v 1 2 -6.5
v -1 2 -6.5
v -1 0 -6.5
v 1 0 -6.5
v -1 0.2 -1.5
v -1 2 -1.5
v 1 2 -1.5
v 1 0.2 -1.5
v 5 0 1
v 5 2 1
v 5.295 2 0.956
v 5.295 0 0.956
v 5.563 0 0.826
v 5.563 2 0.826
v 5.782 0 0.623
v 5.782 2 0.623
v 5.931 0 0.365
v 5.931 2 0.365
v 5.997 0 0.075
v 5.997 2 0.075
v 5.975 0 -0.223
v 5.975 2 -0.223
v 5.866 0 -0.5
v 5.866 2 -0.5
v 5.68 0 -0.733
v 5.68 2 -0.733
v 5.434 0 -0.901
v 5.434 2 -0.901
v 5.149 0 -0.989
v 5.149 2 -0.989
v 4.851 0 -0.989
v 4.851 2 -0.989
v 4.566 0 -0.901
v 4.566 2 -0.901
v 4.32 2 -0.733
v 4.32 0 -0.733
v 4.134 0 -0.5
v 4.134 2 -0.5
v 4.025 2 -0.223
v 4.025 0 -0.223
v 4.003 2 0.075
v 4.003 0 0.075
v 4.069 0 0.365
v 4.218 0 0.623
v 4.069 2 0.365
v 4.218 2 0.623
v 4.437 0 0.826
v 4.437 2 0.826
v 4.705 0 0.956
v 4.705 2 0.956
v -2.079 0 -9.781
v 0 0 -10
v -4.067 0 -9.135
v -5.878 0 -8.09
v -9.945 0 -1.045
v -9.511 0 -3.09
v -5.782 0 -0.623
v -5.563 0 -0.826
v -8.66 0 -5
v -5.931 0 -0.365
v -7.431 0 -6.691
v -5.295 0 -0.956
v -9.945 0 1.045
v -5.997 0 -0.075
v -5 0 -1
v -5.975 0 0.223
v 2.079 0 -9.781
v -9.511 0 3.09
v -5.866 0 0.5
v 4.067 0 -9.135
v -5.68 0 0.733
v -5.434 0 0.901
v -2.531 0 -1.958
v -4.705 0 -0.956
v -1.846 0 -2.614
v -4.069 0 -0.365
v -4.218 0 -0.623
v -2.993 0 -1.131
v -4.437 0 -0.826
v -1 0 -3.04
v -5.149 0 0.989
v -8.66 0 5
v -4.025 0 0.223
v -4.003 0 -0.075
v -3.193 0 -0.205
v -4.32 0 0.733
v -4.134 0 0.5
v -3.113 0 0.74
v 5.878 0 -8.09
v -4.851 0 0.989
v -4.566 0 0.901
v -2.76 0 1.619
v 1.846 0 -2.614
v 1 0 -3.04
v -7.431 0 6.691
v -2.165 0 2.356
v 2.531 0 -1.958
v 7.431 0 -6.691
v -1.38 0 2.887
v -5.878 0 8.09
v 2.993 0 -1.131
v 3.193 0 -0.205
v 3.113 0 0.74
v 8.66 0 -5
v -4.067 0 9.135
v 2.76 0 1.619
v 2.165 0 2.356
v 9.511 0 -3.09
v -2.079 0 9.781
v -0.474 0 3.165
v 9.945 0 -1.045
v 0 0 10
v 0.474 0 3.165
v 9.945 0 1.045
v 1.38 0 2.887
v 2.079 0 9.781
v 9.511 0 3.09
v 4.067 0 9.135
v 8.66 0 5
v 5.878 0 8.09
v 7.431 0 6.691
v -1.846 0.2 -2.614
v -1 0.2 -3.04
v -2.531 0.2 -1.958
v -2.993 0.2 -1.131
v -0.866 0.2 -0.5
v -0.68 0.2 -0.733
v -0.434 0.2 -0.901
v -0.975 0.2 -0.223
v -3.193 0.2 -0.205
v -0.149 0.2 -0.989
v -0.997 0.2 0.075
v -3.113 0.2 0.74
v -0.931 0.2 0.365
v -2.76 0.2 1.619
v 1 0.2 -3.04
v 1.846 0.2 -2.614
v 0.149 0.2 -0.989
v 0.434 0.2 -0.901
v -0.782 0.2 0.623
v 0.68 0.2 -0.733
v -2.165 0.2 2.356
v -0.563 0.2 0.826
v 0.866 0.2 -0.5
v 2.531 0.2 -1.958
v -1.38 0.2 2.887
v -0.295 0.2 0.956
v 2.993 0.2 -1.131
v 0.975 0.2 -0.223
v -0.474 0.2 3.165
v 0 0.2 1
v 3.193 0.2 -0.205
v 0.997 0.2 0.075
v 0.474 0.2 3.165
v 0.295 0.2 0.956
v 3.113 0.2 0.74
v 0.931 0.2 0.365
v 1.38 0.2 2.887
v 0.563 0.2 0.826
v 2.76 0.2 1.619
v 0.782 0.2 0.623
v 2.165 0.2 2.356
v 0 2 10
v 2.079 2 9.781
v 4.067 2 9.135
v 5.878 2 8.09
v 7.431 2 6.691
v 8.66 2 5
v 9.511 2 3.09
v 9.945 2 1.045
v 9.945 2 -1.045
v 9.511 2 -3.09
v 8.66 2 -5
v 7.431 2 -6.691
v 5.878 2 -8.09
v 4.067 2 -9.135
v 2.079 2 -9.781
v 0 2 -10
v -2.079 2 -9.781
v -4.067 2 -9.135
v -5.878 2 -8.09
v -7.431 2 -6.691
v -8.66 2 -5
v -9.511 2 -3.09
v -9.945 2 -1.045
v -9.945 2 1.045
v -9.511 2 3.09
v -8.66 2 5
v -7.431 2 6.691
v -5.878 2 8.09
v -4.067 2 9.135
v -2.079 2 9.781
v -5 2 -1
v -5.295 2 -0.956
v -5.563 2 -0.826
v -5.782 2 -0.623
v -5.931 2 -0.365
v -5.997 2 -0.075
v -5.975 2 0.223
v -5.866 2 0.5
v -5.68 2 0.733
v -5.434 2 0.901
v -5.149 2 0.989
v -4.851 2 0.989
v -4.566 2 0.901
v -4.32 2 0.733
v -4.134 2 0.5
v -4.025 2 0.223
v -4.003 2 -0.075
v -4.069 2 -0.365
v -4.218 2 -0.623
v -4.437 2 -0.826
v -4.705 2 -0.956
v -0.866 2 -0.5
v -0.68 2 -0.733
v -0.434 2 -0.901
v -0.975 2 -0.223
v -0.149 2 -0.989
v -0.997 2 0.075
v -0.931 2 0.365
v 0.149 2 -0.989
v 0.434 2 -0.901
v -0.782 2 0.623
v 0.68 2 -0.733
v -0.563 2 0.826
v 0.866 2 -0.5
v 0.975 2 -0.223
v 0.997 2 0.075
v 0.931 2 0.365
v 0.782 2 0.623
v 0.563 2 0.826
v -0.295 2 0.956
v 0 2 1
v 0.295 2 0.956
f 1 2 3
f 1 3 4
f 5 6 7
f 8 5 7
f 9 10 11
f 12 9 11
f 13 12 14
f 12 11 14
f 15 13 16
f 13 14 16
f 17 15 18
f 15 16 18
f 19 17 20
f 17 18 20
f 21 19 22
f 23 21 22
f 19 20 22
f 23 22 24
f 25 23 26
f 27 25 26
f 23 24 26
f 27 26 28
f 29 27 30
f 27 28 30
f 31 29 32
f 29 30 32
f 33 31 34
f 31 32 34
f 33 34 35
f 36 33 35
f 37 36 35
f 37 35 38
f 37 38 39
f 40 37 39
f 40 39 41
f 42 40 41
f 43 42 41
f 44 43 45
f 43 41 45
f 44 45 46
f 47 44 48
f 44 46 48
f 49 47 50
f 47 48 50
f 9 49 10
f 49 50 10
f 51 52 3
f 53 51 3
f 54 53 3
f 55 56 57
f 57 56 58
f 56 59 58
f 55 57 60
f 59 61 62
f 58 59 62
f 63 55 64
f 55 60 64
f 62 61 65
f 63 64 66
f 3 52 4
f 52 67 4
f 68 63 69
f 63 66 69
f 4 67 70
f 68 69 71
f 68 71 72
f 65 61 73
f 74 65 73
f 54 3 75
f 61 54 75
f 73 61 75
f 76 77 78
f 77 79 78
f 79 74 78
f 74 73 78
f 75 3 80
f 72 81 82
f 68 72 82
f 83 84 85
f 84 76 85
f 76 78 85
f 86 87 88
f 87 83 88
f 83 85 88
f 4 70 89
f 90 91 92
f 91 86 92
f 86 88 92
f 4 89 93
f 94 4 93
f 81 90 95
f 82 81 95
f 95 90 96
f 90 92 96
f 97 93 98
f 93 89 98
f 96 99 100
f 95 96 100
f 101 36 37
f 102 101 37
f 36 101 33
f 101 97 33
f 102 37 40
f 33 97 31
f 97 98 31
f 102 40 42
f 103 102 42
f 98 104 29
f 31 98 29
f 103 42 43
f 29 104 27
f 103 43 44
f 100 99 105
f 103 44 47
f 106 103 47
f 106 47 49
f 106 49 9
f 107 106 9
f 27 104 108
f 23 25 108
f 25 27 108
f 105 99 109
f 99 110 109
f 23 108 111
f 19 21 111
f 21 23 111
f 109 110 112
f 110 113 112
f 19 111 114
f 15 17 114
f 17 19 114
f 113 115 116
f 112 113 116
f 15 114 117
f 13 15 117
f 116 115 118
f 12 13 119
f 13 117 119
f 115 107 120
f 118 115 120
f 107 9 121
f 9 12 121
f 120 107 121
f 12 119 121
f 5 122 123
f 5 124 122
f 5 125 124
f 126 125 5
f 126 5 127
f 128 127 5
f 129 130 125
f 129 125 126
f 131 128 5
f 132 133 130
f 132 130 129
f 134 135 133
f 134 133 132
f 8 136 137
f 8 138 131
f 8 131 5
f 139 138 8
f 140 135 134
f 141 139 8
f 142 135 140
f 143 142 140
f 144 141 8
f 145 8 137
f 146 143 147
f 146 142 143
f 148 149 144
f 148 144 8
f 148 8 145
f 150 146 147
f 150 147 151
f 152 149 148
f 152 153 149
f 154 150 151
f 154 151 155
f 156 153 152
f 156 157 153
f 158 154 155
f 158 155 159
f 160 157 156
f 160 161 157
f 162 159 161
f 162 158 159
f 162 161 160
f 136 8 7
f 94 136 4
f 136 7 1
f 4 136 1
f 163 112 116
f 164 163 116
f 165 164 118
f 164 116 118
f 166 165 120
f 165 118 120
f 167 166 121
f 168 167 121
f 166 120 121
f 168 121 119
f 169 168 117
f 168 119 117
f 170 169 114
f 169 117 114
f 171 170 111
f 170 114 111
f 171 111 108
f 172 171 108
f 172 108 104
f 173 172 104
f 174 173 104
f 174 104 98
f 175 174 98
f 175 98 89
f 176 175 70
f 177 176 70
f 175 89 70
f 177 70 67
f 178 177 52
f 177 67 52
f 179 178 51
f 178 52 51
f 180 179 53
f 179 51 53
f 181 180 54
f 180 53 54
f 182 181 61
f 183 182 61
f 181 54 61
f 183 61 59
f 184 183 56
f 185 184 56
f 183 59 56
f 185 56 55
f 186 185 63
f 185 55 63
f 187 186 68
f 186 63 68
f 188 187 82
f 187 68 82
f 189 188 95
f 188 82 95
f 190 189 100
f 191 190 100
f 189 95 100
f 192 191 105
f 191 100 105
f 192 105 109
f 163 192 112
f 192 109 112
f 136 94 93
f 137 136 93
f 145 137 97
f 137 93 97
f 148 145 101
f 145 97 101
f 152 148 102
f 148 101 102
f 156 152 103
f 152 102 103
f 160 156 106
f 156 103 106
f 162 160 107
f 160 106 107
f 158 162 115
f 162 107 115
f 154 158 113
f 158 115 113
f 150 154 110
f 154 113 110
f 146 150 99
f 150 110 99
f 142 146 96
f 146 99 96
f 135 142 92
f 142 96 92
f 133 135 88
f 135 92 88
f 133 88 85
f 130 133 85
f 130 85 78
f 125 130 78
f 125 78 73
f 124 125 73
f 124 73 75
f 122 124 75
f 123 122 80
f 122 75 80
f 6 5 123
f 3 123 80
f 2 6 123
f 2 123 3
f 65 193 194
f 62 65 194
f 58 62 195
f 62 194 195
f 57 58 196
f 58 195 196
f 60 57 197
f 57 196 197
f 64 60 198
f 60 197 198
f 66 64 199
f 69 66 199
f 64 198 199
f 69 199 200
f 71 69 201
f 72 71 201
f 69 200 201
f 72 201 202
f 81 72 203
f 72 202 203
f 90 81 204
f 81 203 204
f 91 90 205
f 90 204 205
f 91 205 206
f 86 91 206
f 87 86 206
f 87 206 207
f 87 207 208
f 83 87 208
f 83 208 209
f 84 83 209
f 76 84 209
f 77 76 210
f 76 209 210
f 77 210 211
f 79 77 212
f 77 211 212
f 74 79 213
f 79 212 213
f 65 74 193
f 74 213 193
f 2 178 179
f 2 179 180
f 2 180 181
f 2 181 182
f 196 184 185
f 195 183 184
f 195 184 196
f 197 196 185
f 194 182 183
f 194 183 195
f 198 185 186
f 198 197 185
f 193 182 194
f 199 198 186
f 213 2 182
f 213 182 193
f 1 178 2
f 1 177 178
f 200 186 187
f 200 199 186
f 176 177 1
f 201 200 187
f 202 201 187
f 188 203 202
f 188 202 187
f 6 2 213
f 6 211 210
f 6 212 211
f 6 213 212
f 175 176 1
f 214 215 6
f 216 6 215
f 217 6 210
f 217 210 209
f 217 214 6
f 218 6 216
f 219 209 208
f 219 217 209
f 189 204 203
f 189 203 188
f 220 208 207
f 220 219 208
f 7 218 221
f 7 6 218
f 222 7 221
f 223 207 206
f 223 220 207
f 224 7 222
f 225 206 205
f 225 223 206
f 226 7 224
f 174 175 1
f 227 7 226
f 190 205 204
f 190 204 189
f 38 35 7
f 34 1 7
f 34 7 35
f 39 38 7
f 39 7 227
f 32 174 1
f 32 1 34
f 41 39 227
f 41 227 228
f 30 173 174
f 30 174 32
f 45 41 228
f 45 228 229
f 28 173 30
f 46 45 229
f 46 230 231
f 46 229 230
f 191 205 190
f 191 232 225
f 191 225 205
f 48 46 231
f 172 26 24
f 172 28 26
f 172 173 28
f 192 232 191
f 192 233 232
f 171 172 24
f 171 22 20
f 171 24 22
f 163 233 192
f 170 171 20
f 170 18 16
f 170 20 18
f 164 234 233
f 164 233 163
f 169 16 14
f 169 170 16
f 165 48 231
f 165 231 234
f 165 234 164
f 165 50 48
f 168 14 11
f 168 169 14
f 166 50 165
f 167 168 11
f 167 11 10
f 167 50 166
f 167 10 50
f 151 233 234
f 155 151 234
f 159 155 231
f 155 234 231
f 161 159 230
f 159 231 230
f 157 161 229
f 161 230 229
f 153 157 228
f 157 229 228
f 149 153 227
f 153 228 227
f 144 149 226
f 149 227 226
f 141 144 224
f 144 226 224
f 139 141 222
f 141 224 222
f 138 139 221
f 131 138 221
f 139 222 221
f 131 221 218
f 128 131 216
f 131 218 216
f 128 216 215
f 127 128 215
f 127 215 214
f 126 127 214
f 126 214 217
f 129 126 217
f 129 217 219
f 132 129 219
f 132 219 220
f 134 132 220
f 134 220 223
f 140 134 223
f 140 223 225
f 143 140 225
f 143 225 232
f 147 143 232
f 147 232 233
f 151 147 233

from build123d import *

# Parameters (mm, degrees)
SKETCH1_R           = 10
BOSS_EXTRUDE1_DEPTH = 2
SKETCH2_R           = 1
SKETCH2_W           = 2
SKETCH2_H           = 5
CUT_EXTRUDE1_DEPTH  = 2
SKETCH3_R           = 3.2
CUT_EXTRUDE2_DEPTH  = 0.2


with BuildPart() as part:
    # Sketch1 → Boss-Extrude1 (new body)
    with BuildSketch(Plane(origin=(0, 0, 0), x_dir=(1, 0, 0), z_dir=(0, 1, 0))):
        with Locations(Location((0, 0, 0), (0, 0, 270))):
            Circle(SKETCH1_R)
    extrude(amount=BOSS_EXTRUDE1_DEPTH)

    # Sketch2 → Cut-Extrude1 (cut)
    with BuildSketch(Plane(origin=(0, 2, 0), x_dir=(1, 0, 0), z_dir=(0, 1, 0))):
        with Locations(Location((0, 0, 0), (0, 0, 270))):
            Circle(SKETCH2_R)
        with Locations(Location((5, 0, 0), (0, 0, 270))):
            Circle(SKETCH2_R)
        with Locations(Location((-5, 0, 0), (0, 0, 90))):
            Circle(SKETCH2_R)
        with Locations((0, 4)):
            Rectangle(SKETCH2_W, SKETCH2_H)
    extrude(amount=-CUT_EXTRUDE1_DEPTH, mode=Mode.SUBTRACT)

    # Sketch3 → Cut-Extrude2 (cut)
    with BuildSketch(Plane.XZ):
        Circle(SKETCH3_R)
    extrude(amount=-CUT_EXTRUDE2_DEPTH, mode=Mode.SUBTRACT)


solid = part.part
